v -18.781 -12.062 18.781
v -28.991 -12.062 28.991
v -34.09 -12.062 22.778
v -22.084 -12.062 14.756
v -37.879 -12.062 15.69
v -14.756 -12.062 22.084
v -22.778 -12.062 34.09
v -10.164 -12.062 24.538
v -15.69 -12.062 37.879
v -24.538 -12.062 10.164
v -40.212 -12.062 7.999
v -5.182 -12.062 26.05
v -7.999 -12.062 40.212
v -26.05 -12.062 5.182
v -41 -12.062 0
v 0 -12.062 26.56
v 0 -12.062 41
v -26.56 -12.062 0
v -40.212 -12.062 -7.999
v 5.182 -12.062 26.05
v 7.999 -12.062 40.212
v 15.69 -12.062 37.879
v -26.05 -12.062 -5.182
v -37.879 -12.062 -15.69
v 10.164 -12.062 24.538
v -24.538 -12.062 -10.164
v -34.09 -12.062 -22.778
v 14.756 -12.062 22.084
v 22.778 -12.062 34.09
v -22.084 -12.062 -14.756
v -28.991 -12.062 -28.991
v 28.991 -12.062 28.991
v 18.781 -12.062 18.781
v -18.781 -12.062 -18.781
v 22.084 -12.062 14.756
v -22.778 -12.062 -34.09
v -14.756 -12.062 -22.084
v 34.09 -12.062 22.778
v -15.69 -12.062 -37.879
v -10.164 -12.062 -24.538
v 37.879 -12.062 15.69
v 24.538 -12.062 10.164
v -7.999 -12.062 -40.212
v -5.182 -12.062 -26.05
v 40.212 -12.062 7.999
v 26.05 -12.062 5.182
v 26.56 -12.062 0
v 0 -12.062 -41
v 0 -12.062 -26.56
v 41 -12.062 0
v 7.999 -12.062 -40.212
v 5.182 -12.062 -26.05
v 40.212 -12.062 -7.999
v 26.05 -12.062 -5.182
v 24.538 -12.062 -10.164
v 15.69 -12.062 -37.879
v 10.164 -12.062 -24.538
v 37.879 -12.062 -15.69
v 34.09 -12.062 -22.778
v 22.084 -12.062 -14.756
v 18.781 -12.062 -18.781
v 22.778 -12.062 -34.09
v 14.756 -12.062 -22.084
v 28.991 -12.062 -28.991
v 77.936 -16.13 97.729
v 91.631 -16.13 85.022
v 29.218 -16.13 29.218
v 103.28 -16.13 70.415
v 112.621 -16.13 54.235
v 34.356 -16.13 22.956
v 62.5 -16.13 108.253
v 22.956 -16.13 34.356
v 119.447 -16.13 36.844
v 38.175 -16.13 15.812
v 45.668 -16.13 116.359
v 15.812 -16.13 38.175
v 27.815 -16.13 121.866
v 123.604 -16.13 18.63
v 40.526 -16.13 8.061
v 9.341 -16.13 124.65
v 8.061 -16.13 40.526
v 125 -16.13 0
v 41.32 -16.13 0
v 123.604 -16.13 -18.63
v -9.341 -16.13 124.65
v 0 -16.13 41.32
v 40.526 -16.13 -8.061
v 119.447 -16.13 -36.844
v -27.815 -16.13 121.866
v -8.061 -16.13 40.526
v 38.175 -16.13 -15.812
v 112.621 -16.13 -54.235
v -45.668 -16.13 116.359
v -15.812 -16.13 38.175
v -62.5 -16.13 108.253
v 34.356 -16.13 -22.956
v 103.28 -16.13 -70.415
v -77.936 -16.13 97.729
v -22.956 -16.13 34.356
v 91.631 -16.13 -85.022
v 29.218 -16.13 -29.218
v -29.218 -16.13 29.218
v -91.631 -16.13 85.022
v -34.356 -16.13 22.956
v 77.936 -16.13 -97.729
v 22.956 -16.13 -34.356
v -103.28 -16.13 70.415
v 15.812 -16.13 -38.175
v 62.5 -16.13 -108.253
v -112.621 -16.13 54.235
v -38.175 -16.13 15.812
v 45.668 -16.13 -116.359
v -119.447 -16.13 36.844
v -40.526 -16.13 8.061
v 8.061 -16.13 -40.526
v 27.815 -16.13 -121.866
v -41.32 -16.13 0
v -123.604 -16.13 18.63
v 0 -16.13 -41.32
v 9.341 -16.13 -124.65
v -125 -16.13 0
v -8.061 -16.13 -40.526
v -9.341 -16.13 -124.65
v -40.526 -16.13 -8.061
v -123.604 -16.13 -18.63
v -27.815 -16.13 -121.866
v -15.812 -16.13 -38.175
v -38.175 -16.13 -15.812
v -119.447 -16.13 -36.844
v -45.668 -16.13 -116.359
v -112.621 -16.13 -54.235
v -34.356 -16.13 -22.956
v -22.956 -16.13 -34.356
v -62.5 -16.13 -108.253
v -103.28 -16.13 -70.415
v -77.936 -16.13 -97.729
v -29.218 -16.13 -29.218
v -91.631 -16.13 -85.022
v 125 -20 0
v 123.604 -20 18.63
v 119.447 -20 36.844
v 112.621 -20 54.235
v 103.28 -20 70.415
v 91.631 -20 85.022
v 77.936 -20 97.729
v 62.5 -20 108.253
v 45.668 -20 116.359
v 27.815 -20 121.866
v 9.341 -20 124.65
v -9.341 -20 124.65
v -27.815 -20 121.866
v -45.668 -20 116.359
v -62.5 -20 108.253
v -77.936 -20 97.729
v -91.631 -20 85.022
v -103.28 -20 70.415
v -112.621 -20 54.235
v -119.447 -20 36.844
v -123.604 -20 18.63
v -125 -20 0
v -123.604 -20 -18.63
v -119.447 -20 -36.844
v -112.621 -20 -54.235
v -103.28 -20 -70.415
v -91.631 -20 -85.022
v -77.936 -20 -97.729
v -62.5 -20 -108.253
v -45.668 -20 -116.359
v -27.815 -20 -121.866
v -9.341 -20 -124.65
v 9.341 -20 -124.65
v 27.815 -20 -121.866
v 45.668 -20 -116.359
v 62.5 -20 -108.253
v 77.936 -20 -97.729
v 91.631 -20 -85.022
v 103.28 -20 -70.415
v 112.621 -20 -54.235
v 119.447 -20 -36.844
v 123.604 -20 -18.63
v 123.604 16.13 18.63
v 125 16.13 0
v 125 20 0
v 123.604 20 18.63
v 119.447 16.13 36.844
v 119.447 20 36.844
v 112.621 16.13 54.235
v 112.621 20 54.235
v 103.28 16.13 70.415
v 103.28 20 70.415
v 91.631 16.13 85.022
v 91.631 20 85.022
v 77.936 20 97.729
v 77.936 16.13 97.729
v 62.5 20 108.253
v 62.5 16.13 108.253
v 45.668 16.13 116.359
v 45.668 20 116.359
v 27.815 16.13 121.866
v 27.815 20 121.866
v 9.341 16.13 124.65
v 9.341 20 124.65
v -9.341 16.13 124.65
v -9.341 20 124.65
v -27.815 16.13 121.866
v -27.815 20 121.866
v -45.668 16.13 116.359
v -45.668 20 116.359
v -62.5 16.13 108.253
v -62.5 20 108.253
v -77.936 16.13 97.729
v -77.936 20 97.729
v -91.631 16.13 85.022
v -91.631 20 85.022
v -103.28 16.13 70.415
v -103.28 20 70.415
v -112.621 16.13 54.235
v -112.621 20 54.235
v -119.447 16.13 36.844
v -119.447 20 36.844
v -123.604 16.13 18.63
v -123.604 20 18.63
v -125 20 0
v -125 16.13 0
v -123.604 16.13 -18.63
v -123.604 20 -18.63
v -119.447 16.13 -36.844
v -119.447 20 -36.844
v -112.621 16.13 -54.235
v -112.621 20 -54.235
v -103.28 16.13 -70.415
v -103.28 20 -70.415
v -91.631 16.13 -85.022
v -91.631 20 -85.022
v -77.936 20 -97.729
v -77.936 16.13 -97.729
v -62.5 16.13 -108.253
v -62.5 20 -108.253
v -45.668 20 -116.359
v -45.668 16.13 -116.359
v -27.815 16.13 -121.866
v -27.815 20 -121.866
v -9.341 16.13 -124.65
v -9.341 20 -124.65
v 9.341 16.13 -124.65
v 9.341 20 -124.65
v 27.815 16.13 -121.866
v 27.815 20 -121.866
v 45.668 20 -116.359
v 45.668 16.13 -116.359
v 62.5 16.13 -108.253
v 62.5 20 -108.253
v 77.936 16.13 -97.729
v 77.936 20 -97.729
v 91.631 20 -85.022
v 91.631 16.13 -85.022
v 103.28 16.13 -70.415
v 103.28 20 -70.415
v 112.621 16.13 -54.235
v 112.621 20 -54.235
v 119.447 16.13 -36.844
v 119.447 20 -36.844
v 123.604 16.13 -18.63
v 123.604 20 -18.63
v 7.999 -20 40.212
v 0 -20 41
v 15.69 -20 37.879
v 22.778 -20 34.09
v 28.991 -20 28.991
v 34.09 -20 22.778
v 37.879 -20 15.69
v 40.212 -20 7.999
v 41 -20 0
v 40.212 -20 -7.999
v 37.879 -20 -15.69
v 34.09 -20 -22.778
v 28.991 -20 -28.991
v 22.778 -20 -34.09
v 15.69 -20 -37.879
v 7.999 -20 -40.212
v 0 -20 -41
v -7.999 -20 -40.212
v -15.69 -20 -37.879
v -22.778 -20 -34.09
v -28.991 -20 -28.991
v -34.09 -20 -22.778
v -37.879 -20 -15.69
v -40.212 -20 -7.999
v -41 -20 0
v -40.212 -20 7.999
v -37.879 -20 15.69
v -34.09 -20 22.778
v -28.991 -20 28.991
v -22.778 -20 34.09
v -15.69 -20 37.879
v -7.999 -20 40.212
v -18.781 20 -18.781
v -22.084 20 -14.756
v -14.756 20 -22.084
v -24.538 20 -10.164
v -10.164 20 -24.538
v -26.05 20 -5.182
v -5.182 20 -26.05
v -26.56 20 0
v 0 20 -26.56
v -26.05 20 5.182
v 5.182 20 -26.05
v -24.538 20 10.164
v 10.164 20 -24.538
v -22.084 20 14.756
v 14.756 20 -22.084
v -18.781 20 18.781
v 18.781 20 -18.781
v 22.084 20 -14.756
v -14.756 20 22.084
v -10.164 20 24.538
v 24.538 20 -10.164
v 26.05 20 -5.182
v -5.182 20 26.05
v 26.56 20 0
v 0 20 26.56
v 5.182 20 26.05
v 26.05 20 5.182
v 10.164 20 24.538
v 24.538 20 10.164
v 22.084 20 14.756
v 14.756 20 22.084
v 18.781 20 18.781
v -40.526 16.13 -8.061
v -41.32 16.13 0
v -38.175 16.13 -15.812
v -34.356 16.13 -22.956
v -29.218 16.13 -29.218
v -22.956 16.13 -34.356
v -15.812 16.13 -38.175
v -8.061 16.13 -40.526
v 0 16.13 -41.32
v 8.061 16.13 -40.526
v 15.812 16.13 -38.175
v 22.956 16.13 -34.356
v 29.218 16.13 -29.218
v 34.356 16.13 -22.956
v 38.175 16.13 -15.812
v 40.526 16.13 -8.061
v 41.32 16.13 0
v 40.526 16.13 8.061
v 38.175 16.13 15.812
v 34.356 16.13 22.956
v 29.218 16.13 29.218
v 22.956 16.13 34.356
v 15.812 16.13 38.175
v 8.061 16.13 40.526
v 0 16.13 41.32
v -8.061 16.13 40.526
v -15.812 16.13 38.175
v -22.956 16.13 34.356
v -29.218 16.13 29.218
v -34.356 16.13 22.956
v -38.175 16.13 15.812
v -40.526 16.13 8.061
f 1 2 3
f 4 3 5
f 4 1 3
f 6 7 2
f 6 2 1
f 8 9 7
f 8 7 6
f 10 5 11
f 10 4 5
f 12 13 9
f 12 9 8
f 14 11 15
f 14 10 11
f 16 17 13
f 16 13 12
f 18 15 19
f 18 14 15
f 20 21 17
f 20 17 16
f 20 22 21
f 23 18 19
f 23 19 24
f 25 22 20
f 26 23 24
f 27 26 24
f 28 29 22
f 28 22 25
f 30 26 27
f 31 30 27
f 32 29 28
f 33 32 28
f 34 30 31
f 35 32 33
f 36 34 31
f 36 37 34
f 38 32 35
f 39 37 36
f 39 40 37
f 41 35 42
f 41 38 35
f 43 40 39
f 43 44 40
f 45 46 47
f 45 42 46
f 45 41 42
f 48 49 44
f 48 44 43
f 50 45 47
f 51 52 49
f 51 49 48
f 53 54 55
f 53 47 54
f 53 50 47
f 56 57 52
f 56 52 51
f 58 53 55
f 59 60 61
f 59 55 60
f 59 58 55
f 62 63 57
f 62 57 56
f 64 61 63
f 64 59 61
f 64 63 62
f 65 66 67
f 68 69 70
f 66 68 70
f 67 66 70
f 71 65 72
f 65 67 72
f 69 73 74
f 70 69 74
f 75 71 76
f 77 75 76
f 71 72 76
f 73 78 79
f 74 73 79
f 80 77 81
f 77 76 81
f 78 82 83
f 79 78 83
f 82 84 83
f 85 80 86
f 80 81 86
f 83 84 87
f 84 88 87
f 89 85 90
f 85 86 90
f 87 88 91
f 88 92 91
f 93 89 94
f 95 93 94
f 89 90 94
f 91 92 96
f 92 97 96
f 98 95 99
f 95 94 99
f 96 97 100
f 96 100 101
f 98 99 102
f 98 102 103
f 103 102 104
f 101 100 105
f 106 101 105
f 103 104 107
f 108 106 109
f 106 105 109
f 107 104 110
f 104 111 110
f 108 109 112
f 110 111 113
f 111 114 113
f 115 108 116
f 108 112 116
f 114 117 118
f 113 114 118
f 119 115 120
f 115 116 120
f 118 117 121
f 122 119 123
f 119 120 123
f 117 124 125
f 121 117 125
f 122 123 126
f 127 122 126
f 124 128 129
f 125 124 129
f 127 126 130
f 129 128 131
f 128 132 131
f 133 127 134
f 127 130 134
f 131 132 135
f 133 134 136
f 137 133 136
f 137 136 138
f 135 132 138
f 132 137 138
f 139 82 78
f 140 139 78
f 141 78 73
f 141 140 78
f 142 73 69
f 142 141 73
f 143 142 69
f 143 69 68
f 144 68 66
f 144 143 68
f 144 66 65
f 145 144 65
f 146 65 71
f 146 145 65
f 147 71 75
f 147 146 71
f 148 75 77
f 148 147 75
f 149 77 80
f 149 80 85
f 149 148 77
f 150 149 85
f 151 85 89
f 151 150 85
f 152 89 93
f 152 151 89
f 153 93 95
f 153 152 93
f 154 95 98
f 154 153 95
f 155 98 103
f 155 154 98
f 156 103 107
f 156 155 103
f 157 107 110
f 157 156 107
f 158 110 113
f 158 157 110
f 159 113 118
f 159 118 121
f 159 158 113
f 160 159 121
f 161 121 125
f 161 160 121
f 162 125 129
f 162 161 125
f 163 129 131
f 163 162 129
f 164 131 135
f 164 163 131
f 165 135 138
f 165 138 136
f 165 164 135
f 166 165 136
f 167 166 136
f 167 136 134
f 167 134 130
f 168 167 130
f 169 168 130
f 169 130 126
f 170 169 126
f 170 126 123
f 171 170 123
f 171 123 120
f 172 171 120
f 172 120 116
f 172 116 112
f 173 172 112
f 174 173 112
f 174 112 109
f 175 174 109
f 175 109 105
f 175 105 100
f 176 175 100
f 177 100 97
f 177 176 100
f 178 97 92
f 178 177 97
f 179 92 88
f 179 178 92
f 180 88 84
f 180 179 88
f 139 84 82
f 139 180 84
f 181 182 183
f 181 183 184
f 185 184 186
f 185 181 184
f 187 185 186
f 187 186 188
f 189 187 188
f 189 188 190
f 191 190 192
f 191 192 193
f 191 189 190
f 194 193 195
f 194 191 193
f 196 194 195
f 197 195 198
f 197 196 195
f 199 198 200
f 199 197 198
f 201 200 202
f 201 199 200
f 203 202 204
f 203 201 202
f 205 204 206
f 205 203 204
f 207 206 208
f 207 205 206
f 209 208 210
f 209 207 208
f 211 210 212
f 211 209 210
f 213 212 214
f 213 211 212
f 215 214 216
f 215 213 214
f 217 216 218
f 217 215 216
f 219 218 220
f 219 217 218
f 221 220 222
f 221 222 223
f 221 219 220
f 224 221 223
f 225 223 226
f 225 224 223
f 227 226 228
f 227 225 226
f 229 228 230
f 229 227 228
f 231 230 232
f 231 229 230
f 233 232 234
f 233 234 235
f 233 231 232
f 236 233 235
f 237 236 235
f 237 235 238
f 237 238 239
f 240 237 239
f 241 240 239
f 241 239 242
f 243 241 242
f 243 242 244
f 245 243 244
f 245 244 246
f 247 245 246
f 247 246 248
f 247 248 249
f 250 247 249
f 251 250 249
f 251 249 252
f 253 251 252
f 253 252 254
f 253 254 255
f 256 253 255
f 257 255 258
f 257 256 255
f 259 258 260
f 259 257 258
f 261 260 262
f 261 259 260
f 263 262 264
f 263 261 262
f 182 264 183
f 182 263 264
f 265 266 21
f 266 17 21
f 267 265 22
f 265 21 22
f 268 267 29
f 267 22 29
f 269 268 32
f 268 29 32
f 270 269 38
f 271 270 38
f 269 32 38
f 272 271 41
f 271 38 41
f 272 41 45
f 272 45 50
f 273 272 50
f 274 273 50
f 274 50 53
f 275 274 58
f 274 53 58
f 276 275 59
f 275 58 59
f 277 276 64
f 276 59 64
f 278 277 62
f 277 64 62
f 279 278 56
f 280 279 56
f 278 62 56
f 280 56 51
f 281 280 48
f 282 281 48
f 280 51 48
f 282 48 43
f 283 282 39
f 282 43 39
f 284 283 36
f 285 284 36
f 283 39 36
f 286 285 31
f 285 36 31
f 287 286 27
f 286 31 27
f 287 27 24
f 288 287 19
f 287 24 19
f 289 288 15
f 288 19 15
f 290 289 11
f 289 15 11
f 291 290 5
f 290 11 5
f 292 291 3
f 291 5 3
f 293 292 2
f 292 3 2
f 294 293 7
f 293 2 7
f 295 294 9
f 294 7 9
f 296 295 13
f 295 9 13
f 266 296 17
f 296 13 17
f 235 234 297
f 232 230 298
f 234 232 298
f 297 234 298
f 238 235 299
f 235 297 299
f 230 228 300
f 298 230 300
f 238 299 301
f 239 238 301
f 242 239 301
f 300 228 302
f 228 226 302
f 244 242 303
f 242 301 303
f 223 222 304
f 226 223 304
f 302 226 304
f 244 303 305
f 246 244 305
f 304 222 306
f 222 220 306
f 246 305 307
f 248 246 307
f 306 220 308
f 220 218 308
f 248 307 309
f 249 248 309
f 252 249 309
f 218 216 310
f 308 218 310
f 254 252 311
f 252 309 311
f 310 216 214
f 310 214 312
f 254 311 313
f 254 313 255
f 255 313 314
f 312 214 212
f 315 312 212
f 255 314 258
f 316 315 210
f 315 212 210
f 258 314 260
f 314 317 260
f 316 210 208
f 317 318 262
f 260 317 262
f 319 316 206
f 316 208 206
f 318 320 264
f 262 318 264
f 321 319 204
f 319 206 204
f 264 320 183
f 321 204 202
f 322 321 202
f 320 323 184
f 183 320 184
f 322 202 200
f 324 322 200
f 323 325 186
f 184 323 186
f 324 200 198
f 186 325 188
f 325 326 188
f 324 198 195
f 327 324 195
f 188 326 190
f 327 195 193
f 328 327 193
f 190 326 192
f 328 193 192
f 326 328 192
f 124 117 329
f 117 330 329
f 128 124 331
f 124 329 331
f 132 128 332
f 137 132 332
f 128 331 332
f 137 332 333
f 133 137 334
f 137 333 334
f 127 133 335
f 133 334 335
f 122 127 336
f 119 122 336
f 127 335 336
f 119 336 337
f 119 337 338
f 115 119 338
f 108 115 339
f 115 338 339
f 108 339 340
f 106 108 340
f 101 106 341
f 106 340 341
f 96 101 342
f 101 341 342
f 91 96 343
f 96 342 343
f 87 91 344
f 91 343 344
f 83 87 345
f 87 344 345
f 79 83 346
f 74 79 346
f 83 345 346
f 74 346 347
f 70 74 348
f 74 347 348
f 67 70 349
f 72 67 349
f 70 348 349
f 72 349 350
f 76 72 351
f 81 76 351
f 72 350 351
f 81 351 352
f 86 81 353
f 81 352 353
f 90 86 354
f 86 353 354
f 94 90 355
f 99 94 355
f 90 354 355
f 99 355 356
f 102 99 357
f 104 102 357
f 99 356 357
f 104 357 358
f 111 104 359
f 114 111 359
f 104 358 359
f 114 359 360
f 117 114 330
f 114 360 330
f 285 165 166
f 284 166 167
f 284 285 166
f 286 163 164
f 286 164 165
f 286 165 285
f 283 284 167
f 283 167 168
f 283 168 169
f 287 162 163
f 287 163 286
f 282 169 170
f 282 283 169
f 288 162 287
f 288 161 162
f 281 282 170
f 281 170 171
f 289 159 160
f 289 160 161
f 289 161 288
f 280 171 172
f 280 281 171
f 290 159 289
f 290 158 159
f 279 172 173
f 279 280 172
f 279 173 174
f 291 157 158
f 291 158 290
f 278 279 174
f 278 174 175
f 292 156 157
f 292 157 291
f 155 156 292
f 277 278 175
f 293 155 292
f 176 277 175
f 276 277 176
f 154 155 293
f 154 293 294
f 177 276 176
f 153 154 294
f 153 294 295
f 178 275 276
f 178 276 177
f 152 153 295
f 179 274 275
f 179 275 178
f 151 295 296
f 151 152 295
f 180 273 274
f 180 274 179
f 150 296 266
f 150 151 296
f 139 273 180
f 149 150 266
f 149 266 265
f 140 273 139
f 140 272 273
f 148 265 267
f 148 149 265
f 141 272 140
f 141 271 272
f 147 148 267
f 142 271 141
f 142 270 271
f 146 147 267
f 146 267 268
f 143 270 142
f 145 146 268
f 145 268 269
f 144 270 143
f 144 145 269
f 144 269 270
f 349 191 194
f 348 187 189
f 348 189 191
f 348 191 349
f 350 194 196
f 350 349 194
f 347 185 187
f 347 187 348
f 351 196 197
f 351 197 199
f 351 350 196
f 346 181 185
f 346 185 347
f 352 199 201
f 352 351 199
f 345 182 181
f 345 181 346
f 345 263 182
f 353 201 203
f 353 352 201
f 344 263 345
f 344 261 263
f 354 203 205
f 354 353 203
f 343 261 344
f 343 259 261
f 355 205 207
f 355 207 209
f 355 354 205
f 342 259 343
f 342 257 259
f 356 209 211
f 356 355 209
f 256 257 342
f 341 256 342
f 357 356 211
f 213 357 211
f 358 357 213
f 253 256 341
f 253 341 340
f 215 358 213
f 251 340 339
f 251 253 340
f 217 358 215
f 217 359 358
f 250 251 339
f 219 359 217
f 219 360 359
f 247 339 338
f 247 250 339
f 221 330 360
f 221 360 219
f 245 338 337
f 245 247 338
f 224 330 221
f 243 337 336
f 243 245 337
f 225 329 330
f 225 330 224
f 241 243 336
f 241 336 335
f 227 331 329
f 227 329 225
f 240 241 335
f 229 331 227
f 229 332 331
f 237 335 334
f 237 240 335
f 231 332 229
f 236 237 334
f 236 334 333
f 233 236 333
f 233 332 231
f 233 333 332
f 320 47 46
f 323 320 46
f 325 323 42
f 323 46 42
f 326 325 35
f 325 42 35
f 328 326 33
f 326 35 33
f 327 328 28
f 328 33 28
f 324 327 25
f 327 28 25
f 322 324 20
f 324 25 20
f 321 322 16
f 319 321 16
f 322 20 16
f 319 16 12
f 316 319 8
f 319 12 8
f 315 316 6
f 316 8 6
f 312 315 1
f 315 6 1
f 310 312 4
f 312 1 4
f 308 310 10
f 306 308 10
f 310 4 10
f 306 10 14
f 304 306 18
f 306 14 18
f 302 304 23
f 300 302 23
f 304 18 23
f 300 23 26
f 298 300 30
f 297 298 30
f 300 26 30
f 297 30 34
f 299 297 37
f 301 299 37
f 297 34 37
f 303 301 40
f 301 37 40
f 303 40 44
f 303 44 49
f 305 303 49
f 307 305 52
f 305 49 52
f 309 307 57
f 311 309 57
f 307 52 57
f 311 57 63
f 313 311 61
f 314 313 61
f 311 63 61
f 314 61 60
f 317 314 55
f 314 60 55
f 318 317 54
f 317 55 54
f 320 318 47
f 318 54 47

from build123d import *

# Parameters (mm, degrees)
F0_R     = 125
F1_DEPTH = 20
F2_R     = 26.56
F3_DEPTH = 20
F5_W     = 86.677861
F5_H     = 32.26
F7_W     = 7.9375
F7_H     = 41


with BuildPart() as f1:
    # F0 (on Front) → F1 (new body, symmetric)
    with BuildSketch(Plane.XZ):
        Circle(F0_R)
    extrude(amount=F1_DEPTH, both=True)

    # F2 (on Front) → F3 (cut, symmetric)
    with BuildSketch(Plane.XZ):
        Circle(F2_R)
    extrude(amount=F3_DEPTH, both=True, mode=Mode.SUBTRACT)

    # F5 (on Top) → F6 (revolve, cut)
    with BuildSketch(Plane.XY):
        with Locations((-84.65893, 0)):
            Rectangle(F5_W, F5_H)
    revolve(axis=Axis((0, 0, 0), (0, -1, 0)), mode=Mode.SUBTRACT)

    # F7 (on Right) → F8 (revolve, cut)
    with BuildSketch(Plane.YZ):
        with Locations((-16.03125, 20.5)):
            Rectangle(F7_W, F7_H)
    revolve(axis=Axis((0, -16.03125, 0), (0, 1, 0)), mode=Mode.SUBTRACT)


solid = f1.part
